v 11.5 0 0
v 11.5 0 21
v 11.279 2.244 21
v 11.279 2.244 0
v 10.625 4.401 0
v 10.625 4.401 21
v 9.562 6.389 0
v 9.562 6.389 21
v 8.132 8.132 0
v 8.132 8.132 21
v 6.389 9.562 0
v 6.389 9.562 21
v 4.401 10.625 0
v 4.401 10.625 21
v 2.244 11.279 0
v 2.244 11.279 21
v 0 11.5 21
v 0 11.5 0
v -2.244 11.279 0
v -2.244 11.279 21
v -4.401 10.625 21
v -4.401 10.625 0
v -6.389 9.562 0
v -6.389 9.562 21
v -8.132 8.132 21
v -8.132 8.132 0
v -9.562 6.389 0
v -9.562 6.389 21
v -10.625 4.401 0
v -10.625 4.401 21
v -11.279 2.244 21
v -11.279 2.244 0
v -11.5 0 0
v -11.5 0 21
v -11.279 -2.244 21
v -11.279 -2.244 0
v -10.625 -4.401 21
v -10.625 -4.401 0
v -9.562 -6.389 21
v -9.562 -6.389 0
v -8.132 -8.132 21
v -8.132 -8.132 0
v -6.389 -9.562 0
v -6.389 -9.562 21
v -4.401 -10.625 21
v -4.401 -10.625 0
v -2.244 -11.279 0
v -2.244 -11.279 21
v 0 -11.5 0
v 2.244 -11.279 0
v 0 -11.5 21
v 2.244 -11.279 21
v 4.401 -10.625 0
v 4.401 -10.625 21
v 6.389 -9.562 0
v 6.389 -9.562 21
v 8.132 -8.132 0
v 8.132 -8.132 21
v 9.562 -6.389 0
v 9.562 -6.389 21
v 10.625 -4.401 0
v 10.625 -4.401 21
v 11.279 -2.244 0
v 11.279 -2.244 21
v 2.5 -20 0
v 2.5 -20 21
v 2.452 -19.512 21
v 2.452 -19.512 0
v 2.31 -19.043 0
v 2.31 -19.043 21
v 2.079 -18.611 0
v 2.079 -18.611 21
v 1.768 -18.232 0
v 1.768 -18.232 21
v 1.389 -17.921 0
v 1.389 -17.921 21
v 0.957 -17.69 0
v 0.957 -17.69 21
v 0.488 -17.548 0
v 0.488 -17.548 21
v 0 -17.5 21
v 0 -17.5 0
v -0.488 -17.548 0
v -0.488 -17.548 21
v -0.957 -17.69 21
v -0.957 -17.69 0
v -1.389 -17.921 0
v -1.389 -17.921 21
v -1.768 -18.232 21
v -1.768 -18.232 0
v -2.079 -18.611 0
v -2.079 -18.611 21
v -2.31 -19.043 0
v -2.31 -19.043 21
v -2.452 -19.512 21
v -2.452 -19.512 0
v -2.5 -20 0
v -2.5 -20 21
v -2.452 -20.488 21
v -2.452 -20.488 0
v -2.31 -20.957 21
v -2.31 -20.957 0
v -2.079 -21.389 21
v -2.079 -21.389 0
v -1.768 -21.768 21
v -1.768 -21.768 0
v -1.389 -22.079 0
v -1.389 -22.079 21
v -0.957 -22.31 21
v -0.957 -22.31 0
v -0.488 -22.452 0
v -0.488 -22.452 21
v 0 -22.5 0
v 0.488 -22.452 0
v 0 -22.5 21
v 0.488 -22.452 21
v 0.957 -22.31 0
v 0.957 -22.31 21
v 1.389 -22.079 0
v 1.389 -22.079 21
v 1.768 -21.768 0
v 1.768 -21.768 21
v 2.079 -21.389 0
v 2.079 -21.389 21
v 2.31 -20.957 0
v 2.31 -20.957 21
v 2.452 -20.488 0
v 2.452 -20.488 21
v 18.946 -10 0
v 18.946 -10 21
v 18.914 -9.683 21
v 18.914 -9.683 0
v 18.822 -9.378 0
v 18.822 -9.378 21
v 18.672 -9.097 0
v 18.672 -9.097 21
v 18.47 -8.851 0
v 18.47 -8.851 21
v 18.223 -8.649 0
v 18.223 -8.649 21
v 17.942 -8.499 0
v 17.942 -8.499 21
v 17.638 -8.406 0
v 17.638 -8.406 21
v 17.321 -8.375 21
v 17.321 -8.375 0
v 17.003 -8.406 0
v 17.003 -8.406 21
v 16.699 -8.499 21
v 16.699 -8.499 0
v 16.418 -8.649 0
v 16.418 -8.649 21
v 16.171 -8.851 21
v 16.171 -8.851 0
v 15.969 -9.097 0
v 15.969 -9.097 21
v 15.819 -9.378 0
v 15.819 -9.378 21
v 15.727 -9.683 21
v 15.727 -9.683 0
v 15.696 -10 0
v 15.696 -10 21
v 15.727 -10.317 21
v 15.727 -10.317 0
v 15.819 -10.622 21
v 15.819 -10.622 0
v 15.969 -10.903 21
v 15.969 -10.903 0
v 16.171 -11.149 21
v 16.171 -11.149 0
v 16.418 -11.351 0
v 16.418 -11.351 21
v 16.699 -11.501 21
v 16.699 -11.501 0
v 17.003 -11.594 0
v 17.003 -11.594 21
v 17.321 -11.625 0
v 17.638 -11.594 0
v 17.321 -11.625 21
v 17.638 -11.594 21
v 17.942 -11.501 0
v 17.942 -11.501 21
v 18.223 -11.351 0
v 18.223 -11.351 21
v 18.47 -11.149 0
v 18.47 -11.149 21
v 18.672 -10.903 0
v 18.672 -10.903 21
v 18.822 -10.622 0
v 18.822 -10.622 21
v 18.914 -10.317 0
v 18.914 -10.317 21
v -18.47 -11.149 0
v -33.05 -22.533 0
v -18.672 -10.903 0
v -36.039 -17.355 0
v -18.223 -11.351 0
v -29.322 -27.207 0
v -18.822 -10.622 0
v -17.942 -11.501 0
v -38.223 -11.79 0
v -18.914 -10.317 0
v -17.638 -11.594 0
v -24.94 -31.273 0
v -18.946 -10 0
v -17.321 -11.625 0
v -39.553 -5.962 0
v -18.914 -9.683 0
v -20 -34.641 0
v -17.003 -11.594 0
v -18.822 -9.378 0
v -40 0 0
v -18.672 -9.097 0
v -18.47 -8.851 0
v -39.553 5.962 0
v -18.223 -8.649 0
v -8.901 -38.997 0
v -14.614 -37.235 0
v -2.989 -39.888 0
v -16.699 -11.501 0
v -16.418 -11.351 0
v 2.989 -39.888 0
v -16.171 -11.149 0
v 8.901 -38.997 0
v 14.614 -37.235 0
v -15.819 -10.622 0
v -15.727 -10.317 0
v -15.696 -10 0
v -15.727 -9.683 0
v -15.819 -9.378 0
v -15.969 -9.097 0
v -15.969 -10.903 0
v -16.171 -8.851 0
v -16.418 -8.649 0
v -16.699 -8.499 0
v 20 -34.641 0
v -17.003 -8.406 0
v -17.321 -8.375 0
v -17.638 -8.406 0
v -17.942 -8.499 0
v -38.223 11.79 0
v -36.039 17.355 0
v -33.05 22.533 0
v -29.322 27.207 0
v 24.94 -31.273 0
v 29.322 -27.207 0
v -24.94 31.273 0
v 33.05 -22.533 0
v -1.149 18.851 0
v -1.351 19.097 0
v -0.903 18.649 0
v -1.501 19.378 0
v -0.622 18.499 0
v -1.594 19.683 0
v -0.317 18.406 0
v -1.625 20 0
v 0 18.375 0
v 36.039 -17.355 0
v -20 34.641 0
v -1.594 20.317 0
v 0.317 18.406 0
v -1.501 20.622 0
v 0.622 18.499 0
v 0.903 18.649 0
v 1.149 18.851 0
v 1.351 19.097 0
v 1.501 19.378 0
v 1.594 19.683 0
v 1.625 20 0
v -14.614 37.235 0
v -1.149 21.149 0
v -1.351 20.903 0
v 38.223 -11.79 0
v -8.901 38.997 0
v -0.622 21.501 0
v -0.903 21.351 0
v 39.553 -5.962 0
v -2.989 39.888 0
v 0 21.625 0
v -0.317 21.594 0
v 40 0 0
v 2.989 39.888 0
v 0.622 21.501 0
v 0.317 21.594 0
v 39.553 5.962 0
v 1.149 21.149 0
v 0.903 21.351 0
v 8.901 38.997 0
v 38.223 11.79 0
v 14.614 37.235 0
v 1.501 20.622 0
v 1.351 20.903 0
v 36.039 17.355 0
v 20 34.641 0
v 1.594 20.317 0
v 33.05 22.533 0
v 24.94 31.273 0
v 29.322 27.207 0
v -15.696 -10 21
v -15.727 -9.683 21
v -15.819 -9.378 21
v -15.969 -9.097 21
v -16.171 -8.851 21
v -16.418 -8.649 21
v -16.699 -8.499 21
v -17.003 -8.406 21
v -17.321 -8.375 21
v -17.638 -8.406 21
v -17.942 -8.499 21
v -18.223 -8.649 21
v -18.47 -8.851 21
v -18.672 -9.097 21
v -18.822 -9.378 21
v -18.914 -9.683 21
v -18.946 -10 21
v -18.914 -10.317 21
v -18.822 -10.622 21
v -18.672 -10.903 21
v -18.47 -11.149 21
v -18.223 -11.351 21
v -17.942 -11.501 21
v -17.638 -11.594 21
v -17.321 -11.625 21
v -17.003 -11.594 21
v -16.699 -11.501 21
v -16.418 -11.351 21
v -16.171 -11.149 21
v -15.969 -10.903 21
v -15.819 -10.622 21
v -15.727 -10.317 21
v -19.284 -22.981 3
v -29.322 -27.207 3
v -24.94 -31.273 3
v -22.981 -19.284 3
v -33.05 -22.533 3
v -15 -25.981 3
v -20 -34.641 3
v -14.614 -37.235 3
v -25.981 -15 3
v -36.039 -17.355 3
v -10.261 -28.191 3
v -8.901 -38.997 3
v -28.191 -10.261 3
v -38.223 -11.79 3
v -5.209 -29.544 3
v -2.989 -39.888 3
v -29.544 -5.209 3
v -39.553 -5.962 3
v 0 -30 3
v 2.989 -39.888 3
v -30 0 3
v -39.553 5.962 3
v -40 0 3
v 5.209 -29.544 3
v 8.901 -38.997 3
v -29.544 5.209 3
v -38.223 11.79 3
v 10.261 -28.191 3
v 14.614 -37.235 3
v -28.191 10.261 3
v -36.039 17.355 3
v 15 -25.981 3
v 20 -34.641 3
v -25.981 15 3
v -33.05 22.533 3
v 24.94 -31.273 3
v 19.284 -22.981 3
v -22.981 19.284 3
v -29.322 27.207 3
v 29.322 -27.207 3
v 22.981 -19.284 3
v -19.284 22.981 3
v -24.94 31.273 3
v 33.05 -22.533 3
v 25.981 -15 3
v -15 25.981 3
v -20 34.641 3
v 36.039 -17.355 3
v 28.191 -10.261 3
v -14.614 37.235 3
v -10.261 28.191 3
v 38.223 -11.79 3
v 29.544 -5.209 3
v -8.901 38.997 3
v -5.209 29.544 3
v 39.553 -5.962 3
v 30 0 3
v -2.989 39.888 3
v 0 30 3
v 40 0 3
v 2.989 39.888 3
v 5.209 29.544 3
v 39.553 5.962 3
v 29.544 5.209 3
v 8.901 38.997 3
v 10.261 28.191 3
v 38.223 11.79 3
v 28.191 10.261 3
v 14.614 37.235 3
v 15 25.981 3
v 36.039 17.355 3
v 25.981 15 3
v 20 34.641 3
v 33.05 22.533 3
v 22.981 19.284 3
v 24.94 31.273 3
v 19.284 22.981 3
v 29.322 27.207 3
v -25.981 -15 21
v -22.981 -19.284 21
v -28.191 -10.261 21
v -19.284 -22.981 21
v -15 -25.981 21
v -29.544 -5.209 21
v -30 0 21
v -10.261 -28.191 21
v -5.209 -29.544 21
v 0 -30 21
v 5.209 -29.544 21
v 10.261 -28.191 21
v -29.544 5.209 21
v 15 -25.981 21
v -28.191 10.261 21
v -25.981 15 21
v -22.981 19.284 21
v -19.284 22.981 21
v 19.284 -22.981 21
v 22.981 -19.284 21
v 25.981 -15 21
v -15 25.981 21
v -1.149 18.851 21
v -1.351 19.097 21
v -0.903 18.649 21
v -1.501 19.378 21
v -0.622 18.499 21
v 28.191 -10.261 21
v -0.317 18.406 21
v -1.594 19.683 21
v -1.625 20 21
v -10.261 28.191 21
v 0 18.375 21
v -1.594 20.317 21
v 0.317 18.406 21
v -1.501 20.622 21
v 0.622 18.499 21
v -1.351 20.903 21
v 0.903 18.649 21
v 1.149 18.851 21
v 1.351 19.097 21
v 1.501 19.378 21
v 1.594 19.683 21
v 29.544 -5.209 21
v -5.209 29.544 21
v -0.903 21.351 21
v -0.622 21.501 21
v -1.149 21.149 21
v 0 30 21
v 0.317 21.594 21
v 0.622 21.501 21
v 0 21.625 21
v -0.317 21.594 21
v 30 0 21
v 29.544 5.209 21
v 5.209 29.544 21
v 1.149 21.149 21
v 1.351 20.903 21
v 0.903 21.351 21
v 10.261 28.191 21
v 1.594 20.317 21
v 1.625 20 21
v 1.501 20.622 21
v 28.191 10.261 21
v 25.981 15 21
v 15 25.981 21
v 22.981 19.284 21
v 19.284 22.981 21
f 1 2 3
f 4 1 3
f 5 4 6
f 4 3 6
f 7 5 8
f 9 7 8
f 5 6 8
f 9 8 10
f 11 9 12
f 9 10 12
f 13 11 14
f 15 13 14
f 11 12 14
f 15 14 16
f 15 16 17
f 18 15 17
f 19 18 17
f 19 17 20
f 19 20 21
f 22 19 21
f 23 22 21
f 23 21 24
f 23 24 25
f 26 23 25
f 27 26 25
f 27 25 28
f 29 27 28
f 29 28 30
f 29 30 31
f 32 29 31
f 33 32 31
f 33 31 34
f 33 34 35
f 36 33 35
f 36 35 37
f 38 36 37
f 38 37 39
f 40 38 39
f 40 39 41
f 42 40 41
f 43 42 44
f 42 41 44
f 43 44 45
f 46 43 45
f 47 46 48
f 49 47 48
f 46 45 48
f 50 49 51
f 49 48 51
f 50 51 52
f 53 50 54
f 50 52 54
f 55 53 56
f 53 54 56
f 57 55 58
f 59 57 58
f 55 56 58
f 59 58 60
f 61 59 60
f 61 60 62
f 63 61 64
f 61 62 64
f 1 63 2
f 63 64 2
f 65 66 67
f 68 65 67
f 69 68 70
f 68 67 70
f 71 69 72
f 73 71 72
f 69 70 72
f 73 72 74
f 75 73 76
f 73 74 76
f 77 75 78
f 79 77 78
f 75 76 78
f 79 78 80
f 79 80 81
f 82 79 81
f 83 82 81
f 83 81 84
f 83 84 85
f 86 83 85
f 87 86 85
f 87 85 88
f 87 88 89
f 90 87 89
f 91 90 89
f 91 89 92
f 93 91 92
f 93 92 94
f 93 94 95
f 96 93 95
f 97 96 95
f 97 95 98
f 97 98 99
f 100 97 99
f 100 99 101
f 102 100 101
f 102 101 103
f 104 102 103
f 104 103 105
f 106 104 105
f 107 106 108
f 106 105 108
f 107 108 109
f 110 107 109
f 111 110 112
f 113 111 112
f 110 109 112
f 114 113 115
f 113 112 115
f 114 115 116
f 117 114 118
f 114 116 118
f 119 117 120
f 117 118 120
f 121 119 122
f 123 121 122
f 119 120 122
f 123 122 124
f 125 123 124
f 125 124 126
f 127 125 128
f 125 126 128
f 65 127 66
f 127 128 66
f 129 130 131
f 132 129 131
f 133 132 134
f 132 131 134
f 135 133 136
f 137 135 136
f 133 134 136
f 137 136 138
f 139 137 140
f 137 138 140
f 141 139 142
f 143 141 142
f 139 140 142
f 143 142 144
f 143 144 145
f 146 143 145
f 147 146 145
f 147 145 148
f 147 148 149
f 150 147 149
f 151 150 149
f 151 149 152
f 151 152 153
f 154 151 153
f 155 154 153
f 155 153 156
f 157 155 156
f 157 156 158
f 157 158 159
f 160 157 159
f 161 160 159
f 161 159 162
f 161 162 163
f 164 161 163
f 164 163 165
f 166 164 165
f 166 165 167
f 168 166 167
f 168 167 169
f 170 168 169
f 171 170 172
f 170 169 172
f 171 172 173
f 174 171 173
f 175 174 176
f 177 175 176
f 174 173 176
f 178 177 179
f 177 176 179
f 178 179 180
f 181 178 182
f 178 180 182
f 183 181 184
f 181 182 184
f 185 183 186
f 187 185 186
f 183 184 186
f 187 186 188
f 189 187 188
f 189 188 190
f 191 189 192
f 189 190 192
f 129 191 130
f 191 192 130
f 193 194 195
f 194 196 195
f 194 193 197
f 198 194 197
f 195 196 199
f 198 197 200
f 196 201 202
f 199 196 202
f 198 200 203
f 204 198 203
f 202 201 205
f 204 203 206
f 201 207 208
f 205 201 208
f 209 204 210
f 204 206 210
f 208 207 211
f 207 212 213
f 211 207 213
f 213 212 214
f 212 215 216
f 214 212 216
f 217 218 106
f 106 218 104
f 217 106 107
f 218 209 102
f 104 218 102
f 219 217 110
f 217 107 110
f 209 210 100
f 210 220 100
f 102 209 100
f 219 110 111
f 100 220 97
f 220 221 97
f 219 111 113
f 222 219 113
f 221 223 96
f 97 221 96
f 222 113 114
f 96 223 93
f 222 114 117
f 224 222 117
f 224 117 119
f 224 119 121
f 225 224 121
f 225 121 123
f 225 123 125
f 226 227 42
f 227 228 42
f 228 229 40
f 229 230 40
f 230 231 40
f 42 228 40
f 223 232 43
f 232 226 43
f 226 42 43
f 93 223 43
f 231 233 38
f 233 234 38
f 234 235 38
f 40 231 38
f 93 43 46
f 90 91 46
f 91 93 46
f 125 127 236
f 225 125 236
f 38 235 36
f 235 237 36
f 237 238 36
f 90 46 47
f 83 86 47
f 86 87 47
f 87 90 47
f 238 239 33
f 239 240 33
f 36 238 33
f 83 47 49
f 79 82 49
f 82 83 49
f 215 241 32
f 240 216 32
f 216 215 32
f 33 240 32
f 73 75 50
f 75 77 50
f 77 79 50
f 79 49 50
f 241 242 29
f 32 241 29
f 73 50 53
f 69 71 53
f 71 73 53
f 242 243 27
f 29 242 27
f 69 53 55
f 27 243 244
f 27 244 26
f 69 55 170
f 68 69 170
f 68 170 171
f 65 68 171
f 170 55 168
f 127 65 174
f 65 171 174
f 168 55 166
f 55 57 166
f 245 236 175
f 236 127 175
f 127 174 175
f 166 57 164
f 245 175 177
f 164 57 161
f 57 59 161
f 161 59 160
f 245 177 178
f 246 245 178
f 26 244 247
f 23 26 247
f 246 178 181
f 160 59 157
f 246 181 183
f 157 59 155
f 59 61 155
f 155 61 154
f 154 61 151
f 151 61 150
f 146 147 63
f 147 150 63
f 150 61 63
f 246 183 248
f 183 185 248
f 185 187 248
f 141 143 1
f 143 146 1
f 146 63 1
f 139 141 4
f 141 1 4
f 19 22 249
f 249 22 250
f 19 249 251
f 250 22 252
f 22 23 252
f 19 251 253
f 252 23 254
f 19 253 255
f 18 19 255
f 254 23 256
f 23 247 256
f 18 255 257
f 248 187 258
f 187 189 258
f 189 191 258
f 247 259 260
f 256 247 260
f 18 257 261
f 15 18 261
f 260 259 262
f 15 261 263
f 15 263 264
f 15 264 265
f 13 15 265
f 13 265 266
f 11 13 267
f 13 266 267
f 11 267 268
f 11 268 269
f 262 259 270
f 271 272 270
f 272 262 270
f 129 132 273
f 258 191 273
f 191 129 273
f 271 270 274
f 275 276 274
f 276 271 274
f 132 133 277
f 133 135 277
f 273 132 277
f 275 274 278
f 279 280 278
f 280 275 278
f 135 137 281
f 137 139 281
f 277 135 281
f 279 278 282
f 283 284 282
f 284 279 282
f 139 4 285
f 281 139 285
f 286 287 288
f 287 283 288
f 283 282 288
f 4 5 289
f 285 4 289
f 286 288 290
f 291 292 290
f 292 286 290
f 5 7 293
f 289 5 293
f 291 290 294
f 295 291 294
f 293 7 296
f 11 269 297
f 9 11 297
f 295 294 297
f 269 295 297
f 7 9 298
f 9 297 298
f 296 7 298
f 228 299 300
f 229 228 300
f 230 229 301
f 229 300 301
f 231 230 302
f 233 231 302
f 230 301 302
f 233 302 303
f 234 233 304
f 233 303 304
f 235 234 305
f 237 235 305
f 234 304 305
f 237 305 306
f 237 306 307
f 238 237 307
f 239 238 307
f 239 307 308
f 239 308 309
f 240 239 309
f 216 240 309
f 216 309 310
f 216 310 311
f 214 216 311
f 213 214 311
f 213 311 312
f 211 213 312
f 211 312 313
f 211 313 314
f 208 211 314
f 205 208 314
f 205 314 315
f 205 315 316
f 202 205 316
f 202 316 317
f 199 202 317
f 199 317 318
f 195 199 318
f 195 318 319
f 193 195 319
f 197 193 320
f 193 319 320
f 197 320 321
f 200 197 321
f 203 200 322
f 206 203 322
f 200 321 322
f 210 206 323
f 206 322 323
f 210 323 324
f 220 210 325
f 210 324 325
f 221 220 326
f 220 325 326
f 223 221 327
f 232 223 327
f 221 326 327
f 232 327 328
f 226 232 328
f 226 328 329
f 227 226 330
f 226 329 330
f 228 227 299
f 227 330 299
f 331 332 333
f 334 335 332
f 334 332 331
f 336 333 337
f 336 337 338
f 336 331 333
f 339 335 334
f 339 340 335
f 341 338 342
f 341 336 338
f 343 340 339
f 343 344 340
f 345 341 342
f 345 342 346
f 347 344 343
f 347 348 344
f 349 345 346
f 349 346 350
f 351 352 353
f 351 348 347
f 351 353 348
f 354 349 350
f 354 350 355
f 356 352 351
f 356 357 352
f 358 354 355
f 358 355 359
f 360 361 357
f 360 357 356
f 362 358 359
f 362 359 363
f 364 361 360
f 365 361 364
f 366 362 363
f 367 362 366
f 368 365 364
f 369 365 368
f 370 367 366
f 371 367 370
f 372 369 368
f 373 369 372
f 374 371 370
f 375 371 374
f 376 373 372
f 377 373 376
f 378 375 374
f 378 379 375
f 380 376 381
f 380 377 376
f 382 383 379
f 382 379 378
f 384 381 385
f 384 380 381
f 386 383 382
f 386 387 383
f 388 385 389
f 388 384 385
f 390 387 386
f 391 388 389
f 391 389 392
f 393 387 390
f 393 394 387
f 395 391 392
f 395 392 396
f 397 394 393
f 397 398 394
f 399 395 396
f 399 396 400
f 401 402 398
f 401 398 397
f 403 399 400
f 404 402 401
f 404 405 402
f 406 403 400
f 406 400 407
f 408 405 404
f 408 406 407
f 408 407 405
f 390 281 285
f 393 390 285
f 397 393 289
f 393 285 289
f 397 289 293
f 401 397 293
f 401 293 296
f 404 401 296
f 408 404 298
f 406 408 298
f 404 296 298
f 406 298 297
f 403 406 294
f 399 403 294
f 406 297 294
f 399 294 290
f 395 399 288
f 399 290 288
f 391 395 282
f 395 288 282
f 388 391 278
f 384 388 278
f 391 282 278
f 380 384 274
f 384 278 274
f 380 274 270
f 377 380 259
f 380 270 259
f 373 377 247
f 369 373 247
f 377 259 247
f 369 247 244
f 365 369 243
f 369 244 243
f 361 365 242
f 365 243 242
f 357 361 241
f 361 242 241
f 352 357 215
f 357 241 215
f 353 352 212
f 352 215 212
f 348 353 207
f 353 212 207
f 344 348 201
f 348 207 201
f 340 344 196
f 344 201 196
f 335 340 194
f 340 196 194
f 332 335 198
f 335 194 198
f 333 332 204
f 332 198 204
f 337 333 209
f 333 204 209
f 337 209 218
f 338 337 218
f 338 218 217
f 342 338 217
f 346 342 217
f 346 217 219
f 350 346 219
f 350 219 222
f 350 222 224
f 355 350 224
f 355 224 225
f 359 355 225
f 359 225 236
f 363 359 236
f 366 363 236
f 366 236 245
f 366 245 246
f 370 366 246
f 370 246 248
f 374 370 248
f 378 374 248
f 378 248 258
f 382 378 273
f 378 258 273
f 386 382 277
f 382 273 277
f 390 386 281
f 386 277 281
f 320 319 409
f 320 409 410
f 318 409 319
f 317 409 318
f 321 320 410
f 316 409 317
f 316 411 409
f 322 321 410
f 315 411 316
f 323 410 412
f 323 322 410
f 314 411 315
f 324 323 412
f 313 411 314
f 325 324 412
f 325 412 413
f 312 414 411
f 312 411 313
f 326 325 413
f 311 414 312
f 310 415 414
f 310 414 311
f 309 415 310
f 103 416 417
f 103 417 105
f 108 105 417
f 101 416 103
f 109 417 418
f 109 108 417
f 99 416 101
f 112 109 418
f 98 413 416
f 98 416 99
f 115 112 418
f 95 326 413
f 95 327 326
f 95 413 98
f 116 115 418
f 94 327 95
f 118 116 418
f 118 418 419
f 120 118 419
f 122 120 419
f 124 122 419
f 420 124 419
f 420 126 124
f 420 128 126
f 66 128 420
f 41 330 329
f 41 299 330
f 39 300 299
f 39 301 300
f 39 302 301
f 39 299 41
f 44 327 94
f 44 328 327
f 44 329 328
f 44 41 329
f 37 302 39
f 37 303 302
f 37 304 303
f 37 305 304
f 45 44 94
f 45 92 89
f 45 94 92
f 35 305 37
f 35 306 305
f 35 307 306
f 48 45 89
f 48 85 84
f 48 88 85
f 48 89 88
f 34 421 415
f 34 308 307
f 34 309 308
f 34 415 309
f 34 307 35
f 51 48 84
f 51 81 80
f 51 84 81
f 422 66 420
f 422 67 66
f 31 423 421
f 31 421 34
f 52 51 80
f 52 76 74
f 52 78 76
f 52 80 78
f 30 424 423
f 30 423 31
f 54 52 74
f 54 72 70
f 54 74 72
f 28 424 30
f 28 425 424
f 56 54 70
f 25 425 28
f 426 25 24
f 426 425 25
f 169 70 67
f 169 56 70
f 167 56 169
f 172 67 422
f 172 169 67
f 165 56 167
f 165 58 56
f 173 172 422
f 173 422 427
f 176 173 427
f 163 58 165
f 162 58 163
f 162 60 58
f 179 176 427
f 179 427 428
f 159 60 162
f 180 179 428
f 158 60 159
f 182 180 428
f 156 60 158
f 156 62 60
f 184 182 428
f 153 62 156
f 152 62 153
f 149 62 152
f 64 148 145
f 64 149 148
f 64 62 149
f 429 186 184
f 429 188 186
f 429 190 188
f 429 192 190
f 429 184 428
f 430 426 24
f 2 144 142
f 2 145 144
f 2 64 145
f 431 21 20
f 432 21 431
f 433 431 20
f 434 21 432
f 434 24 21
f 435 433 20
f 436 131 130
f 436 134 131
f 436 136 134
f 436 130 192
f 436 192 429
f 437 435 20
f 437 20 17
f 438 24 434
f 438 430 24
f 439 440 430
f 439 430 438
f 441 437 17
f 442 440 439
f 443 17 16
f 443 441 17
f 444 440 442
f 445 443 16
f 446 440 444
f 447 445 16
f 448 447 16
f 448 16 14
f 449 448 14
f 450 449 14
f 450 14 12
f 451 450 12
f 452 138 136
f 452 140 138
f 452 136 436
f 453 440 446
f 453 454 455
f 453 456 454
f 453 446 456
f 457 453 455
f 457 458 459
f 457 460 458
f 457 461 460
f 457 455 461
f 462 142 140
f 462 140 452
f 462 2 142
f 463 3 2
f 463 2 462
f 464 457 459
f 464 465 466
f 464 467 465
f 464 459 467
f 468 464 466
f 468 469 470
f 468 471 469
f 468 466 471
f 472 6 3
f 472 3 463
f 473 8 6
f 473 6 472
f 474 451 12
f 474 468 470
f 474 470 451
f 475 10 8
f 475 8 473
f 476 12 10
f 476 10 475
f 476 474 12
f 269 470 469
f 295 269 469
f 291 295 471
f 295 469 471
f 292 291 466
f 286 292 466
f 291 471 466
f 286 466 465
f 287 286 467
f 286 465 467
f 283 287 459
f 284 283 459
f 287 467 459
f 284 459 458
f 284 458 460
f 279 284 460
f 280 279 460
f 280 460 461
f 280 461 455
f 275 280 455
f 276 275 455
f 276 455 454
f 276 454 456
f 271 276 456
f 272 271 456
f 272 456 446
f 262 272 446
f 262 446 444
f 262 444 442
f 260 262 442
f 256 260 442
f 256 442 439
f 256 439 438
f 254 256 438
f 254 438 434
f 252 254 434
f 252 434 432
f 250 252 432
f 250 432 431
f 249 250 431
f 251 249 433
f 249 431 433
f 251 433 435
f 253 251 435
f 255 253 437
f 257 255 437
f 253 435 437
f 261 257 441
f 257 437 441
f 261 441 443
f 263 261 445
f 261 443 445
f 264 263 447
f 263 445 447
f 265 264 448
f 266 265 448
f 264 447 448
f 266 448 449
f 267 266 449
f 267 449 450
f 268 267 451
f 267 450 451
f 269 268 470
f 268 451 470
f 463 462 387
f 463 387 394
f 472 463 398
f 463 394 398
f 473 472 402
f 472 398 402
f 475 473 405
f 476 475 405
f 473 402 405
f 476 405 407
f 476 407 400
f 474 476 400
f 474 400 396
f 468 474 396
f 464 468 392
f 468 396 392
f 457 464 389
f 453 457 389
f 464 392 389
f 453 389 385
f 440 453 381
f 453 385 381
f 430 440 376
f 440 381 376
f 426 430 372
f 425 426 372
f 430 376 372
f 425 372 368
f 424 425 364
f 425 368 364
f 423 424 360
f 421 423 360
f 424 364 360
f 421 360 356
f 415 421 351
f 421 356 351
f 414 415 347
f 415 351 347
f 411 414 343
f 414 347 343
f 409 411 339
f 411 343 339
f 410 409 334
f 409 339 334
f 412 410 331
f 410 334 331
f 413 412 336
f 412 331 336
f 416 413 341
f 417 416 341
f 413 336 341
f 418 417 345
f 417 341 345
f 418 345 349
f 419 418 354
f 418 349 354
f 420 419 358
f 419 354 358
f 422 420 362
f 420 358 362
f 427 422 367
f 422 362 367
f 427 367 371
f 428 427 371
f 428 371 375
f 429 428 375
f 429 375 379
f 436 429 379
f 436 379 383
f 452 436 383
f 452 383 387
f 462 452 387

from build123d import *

# Parameters (mm, degrees)
SKETCH1_R           = 40
BOSS_EXTRUDE1_DEPTH = 3
SKETCH2_R           = 30
BOSS_EXTRUDE2_DEPTH = 18
SKETCH3_R           = 1.625
SKETCH3_R_2         = 11.5
SKETCH3_R_3         = 2.5
CUT_EXTRUDE1_DEPTH  = 61.340699366


with BuildPart() as part:
    # Sketch1 → Boss-Extrude1 (new body)
    with BuildSketch(Plane.XY):
        Circle(SKETCH1_R)
    extrude(amount=BOSS_EXTRUDE1_DEPTH)

    # Sketch2 → Boss-Extrude2 (add)
    with BuildSketch(Plane.XY.offset(3)):
        Circle(SKETCH2_R)
    extrude(amount=BOSS_EXTRUDE2_DEPTH)

    # Sketch3 → Cut-Extrude1 (cut, through all)
    with BuildSketch(Plane.XY.offset(21)):
        with Locations((0, 20)):
            Circle(SKETCH3_R)
        with Locations((17.320508076, -10)):
            Circle(SKETCH3_R)
        with Locations((-17.320508076, -10)):
            Circle(SKETCH3_R)
        Circle(SKETCH3_R_2)
        with Locations((0, -20)):
            Circle(SKETCH3_R_3)
    extrude(amount=-CUT_EXTRUDE1_DEPTH, mode=Mode.SUBTRACT)


solid = part.part
